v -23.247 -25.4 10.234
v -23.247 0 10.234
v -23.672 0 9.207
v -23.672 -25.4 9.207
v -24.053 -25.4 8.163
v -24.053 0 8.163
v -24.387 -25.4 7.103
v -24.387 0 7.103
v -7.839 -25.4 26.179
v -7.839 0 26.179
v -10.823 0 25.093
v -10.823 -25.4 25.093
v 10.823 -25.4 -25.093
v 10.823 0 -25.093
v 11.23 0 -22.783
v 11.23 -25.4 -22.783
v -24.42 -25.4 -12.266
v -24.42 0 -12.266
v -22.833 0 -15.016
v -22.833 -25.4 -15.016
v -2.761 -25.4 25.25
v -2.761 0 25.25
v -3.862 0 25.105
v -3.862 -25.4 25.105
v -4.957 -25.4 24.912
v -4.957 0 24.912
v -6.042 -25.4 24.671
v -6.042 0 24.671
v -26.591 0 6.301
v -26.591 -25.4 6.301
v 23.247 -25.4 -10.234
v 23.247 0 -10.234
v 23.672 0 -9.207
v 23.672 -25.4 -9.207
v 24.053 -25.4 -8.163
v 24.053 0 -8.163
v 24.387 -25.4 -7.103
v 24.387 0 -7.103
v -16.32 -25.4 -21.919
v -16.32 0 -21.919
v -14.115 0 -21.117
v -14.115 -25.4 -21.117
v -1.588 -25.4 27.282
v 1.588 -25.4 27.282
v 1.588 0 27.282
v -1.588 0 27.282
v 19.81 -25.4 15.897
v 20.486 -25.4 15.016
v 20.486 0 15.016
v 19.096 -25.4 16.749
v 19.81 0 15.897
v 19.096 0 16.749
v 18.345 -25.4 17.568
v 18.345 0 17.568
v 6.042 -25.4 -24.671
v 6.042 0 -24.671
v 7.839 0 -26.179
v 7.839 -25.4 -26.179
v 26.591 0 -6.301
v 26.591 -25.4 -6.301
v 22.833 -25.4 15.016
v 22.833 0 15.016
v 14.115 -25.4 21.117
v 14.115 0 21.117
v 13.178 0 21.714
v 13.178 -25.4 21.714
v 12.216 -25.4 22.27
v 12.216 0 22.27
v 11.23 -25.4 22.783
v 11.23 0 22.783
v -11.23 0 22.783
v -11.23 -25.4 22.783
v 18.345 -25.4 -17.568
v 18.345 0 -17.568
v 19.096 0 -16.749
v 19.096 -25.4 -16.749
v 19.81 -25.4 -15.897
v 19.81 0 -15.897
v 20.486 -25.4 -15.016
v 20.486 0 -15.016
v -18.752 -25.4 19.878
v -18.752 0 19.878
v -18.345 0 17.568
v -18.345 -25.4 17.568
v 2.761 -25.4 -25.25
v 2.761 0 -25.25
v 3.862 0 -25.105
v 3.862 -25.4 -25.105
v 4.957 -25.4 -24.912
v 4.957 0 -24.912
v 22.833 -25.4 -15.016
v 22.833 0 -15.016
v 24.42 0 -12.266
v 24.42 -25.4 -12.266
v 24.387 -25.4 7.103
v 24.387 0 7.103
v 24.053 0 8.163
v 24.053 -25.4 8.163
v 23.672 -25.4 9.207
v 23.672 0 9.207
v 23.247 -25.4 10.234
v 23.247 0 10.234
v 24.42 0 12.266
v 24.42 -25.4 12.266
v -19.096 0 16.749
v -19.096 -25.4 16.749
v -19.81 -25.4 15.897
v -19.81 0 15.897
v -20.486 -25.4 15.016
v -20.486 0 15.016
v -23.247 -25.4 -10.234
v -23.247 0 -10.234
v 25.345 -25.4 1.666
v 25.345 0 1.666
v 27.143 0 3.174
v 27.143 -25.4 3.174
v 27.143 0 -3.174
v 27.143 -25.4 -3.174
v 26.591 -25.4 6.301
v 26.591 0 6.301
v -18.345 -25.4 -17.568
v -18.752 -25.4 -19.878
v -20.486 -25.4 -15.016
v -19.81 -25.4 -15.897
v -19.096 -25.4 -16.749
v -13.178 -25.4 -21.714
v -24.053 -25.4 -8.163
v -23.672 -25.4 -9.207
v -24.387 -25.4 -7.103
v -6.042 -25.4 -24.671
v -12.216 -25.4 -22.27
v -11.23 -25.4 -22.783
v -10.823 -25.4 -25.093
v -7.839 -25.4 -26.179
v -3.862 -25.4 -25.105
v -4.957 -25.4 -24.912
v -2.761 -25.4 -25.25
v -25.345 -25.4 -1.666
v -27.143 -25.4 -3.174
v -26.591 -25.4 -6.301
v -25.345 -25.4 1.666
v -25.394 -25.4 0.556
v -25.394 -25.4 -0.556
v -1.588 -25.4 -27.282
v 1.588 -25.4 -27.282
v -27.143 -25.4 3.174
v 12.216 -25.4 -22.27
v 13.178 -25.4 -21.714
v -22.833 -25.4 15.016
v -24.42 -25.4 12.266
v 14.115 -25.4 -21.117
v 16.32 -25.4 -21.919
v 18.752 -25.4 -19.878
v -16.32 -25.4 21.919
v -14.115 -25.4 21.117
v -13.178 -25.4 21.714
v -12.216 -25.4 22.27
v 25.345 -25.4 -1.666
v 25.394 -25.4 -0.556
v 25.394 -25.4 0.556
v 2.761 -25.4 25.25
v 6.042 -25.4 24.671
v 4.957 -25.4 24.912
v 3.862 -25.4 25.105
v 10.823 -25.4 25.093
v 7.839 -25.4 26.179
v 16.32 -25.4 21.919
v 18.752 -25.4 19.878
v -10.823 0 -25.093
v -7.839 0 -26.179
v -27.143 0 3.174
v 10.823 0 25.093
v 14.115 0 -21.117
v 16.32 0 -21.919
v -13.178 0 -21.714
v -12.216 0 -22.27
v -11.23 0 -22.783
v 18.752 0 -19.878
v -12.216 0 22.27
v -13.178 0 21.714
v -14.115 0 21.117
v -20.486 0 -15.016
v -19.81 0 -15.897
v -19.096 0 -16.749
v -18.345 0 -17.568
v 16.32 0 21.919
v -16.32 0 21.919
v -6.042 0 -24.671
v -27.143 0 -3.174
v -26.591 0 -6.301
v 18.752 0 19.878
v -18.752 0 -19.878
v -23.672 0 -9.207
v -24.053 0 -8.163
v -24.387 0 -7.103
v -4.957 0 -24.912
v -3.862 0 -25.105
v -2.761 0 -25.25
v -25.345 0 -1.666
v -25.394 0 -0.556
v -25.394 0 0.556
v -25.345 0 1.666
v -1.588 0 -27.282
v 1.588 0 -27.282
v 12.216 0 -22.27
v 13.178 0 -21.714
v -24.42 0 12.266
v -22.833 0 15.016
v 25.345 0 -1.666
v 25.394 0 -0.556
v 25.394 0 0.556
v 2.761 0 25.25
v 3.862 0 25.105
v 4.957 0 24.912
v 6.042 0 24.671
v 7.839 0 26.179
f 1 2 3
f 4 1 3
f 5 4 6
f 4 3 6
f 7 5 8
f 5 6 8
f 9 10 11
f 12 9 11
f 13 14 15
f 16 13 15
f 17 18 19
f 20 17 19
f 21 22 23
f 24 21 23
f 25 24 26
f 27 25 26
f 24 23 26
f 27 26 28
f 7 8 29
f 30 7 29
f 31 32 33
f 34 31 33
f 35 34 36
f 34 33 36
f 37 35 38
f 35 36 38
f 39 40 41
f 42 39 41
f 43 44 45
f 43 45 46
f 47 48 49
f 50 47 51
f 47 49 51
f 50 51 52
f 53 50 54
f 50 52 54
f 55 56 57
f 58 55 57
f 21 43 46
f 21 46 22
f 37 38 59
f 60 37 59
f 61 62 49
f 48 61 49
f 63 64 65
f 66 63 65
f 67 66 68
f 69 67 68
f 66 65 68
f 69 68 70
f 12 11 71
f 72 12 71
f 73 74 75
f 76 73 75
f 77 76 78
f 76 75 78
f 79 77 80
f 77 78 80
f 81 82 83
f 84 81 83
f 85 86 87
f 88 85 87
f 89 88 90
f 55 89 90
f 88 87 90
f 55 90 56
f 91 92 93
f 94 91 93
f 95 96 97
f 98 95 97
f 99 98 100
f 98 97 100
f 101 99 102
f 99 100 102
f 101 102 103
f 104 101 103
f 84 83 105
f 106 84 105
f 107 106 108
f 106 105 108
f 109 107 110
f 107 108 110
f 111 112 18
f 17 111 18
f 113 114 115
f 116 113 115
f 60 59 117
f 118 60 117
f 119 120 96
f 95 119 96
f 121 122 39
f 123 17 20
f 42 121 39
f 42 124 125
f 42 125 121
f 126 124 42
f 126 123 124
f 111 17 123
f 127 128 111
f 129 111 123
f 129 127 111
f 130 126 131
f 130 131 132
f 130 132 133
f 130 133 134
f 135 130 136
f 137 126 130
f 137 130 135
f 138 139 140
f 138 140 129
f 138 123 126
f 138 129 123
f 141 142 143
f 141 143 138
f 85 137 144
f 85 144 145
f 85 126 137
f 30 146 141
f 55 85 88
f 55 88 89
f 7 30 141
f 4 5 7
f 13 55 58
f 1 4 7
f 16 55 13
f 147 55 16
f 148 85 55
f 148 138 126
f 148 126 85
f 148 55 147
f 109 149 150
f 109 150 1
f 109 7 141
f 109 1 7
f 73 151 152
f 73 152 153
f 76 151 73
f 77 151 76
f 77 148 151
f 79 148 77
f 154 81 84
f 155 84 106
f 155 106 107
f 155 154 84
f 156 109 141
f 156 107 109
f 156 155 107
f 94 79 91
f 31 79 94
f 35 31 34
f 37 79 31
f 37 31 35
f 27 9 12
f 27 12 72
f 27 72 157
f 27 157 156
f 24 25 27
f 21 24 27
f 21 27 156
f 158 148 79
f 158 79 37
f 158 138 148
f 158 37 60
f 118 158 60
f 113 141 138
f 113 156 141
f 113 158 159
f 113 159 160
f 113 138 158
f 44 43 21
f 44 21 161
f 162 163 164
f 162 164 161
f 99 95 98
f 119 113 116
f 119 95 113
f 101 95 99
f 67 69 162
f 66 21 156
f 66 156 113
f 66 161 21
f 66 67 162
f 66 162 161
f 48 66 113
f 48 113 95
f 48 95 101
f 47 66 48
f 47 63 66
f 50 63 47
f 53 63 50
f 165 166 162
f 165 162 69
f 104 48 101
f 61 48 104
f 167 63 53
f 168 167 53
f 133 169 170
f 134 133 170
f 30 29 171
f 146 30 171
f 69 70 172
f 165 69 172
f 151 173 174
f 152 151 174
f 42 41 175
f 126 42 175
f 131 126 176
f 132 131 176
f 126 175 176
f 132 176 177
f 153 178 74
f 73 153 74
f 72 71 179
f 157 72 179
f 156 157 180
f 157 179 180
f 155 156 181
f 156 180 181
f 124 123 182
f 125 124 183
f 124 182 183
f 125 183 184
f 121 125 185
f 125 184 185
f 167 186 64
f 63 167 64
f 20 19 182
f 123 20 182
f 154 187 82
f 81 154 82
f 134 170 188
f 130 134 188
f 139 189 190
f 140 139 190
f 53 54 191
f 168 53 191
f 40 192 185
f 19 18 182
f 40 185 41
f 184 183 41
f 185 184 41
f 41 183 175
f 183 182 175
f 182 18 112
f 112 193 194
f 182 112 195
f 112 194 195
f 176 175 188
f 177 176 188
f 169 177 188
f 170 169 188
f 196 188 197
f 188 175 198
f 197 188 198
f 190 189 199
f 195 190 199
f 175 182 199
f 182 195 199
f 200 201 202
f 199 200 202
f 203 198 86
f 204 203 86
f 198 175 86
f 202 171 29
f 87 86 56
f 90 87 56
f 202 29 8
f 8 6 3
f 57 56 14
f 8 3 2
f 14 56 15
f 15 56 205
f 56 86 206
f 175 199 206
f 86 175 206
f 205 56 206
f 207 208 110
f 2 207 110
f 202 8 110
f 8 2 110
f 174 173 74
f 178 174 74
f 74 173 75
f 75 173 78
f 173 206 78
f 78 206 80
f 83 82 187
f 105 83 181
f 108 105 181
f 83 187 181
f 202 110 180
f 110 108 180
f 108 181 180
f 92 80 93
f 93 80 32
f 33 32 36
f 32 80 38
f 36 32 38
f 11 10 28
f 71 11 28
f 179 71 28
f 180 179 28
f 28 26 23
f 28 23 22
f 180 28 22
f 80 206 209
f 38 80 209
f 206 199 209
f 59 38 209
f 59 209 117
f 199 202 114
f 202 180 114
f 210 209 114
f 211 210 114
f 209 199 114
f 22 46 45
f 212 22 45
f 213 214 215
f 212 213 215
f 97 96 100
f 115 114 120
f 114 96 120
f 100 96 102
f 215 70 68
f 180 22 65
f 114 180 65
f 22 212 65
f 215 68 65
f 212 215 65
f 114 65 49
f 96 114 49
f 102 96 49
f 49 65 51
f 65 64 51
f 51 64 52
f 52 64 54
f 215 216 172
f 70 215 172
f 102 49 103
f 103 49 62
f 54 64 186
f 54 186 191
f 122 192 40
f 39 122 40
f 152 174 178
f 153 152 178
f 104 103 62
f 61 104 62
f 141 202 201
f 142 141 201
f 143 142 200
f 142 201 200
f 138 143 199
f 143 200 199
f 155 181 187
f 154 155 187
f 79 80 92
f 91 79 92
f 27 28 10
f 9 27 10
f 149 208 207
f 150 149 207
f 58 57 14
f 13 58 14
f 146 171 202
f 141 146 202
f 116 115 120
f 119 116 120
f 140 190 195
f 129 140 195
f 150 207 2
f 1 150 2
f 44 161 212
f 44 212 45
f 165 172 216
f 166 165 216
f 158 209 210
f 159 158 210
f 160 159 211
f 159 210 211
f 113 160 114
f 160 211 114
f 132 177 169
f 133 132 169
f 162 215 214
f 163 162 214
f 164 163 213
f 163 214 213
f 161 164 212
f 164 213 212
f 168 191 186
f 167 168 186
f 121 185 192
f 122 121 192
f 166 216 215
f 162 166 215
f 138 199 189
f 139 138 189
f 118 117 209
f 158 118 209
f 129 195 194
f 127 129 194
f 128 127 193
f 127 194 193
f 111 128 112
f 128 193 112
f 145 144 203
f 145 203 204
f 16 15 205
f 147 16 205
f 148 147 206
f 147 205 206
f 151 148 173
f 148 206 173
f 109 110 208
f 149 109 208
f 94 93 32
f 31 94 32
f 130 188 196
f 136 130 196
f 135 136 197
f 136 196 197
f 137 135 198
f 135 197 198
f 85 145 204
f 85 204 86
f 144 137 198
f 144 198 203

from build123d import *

# Parameters (mm, degrees)
F1_DEPTH = 25.4


with BuildPart() as f1:
    # F0 (on Front) → F1 (new body)
    with BuildSketch(Plane.XZ):
        with BuildLine():
            Line((-1.5875, 27.281528), (-2.760676, 25.249528))
            ThreePointArc((-2.760676, 25.249528), (-4.410664, 25.014117), (-6.041661, 24.671002))
            ThreePointArc((-6.041661, 24.671002), (-8.687312, 23.868193), (-11.230034, 22.782589))
            ThreePointArc((-11.230034, 22.782589), (-12.7, 21.997045), (-14.115283, 21.116789))
            ThreePointArc((-14.115283, 21.116789), (-16.326805, 19.457529), (-18.344884, 17.567733))
            ThreePointArc((-18.344884, 17.567733), (-19.457529, 16.326805), (-20.486395, 15.015579))
            ThreePointArc((-20.486395, 15.015579), (-21.997045, 12.7), (-23.247071, 10.233949))
            ThreePointArc((-23.247071, 10.233949), (-23.868193, 8.687312), (-24.386545, 7.103269))
            ThreePointArc((-24.386545, 7.103269), (-25.014117, 4.410664), (-25.345317, 1.6658))
            ThreePointArc((-25.345317, 1.6658), (-25.4, 0), (-25.345317, -1.6658))
            ThreePointArc((-25.345317, -1.6658), (-25.014117, -4.410664), (-24.386545, -7.103269))
            ThreePointArc((-24.386545, -7.103269), (-23.868193, -8.687312), (-23.247071, -10.233949))
            ThreePointArc((-23.247071, -10.233949), (-21.997045, -12.7), (-20.486395, -15.015579))
            ThreePointArc((-20.486395, -15.015579), (-19.457529, -16.326805), (-18.344884, -17.567733))
            ThreePointArc((-18.344884, -17.567733), (-16.326805, -19.457529), (-14.115283, -21.116789))
            ThreePointArc((-14.115283, -21.116789), (-12.7, -21.997045), (-11.230034, -22.782589))
            ThreePointArc((-11.230034, -22.782589), (-8.687312, -23.868193), (-6.041661, -24.671002))
            ThreePointArc((-6.041661, -24.671002), (-4.410664, -25.014117), (-2.760676, -25.249528))
            ThreePointArc((-2.760676, -25.249528), (0, -25.4), (2.760676, -25.249528))
            ThreePointArc((2.760676, -25.249528), (4.410664, -25.014117), (6.041661, -24.671002))
            ThreePointArc((6.041661, -24.671002), (8.687312, -23.868193), (11.230034, -22.782589))
            ThreePointArc((11.230034, -22.782589), (12.7, -21.997045), (14.115283, -21.116789))
            ThreePointArc((14.115283, -21.116789), (16.326805, -19.457529), (18.344884, -17.567733))
            ThreePointArc((18.344884, -17.567733), (19.457529, -16.326805), (20.486395, -15.015579))
            ThreePointArc((20.486395, -15.015579), (21.997045, -12.7), (23.247071, -10.233949))
            ThreePointArc((23.247071, -10.233949), (23.868193, -8.687312), (24.386545, -7.103269))
            ThreePointArc((24.386545, -7.103269), (25.014117, -4.410664), (25.345317, -1.6658))
            ThreePointArc((25.345317, -1.6658), (25.4, 0), (25.345317, 1.6658))
            ThreePointArc((25.345317, 1.6658), (25.014117, 4.410664), (24.386545, 7.103269))
            ThreePointArc((24.386545, 7.103269), (23.868193, 8.687312), (23.247071, 10.233949))
            ThreePointArc((23.247071, 10.233949), (21.997045, 12.7), (20.486395, 15.015579))
            ThreePointArc((20.486395, 15.015579), (19.457529, 16.326805), (18.344884, 17.567733))
            ThreePointArc((18.344884, 17.567733), (16.326805, 19.457529), (14.115283, 21.116789))
            ThreePointArc((14.115283, 21.116789), (12.7, 21.997045), (11.230034, 22.782589))
            ThreePointArc((11.230034, 22.782589), (8.687312, 23.868193), (6.041661, 24.671002))
            ThreePointArc((6.041661, 24.671002), (4.410664, 25.014117), (2.760676, 25.249528))
            Line((2.760676, 25.249528), (1.5875, 27.281528))
            Line((1.5875, 27.281528), (-1.5875, 27.281528))
        make_face()
        with BuildLine():
            ThreePointArc((-11.230034, 22.782589), (-8.687312, 23.868193), (-6.041661, 24.671002))
            Line((-6.041661, 24.671002), (-7.83907, 26.179208))
            Line((-7.83907, 26.179208), (-10.822594, 25.093294))
            Line((-10.822594, 25.093294), (-11.230034, 22.782589))
        make_face()
        with BuildLine():
            ThreePointArc((-18.344884, 17.567733), (-16.326805, 19.457529), (-14.115283, 21.116789))
            Line((-14.115283, 21.116789), (-16.320133, 21.919288))
            Line((-16.320133, 21.919288), (-18.752324, 19.878438))
            Line((-18.752324, 19.878438), (-18.344884, 17.567733))
        make_face()
        with BuildLine():
            Line((7.83907, 26.179208), (6.041661, 24.671002))
            ThreePointArc((6.041661, 24.671002), (8.687312, 23.868193), (11.230034, 22.782589))
            Line((11.230034, 22.782589), (10.822594, 25.093294))
            Line((10.822594, 25.093294), (7.83907, 26.179208))
        make_face()
        with BuildLine():
            ThreePointArc((-23.247071, 10.233949), (-21.997045, 12.7), (-20.486395, 15.015579))
            Line((-20.486395, 15.015579), (-22.832746, 15.015579))
            Line((-22.832746, 15.015579), (-24.420246, 12.265949))
            Line((-24.420246, 12.265949), (-23.247071, 10.233949))
        make_face()
        with BuildLine():
            Line((16.320133, 21.919288), (14.115283, 21.116789))
            ThreePointArc((14.115283, 21.116789), (16.326805, 19.457529), (18.344884, 17.567733))
            Line((18.344884, 17.567733), (18.752324, 19.878438))
            Line((18.752324, 19.878438), (16.320133, 21.919288))
        make_face()
        with BuildLine():
            ThreePointArc((-25.345317, 1.6658), (-25.014117, 4.410664), (-24.386545, 7.103269))
            Line((-24.386545, 7.103269), (-26.591394, 6.30077))
            Line((-26.591394, 6.30077), (-27.142727, 3.174005))
            Line((-27.142727, 3.174005), (-25.345317, 1.6658))
        make_face()
        with BuildLine():
            Line((22.832746, 15.015579), (20.486395, 15.015579))
            ThreePointArc((20.486395, 15.015579), (21.997045, 12.7), (23.247071, 10.233949))
            Line((23.247071, 10.233949), (24.420246, 12.265949))
            Line((24.420246, 12.265949), (22.832746, 15.015579))
        make_face()
        with BuildLine():
            ThreePointArc((-24.386545, -7.103269), (-25.014117, -4.410664), (-25.345317, -1.6658))
            Line((-25.345317, -1.6658), (-27.142727, -3.174005))
            Line((-27.142727, -3.174005), (-26.591394, -6.30077))
            Line((-26.591394, -6.30077), (-24.386545, -7.103269))
        make_face()
        with BuildLine():
            Line((26.591394, 6.30077), (24.386545, 7.103269))
            ThreePointArc((24.386545, 7.103269), (25.014117, 4.410664), (25.345317, 1.6658))
            Line((25.345317, 1.6658), (27.142727, 3.174005))
            Line((27.142727, 3.174005), (26.591394, 6.30077))
        make_face()
        with BuildLine():
            ThreePointArc((-20.486395, -15.015579), (-21.997045, -12.7), (-23.247071, -10.233949))
            Line((-23.247071, -10.233949), (-24.420246, -12.265949))
            Line((-24.420246, -12.265949), (-22.832746, -15.015579))
            Line((-22.832746, -15.015579), (-20.486395, -15.015579))
        make_face()
        with BuildLine():
            Line((27.142727, -3.174005), (25.345317, -1.6658))
            ThreePointArc((25.345317, -1.6658), (25.014117, -4.410664), (24.386545, -7.103269))
            Line((24.386545, -7.103269), (26.591394, -6.30077))
            Line((26.591394, -6.30077), (27.142727, -3.174005))
        make_face()
        with BuildLine():
            ThreePointArc((-14.115283, -21.116789), (-16.326805, -19.457529), (-18.344884, -17.567733))
            Line((-18.344884, -17.567733), (-18.752324, -19.878438))
            Line((-18.752324, -19.878438), (-16.320133, -21.919288))
            Line((-16.320133, -21.919288), (-14.115283, -21.116789))
        make_face()
        with BuildLine():
            Line((24.420246, -12.265949), (23.247071, -10.233949))
            ThreePointArc((23.247071, -10.233949), (21.997045, -12.7), (20.486395, -15.015579))
            Line((20.486395, -15.015579), (22.832746, -15.015579))
            Line((22.832746, -15.015579), (24.420246, -12.265949))
        make_face()
        with BuildLine():
            ThreePointArc((-6.041661, -24.671002), (-8.687312, -23.868193), (-11.230034, -22.782589))
            Line((-11.230034, -22.782589), (-10.822594, -25.093294))
            Line((-10.822594, -25.093294), (-7.83907, -26.179208))
            Line((-7.83907, -26.179208), (-6.041661, -24.671002))
        make_face()
        with BuildLine():
            Line((18.752324, -19.878438), (18.344884, -17.567733))
            ThreePointArc((18.344884, -17.567733), (16.326805, -19.457529), (14.115283, -21.116789))
            Line((14.115283, -21.116789), (16.320133, -21.919288))
            Line((16.320133, -21.919288), (18.752324, -19.878438))
        make_face()
        with BuildLine():
            ThreePointArc((2.760676, -25.249528), (0, -25.4), (-2.760676, -25.249528))
            Line((-2.760676, -25.249528), (-1.5875, -27.281528))
            Line((-1.5875, -27.281528), (1.5875, -27.281528))
            Line((1.5875, -27.281528), (2.760676, -25.249528))
        make_face()
        with BuildLine():
            Line((10.822594, -25.093294), (11.230034, -22.782589))
            ThreePointArc((11.230034, -22.782589), (8.687312, -23.868193), (6.041661, -24.671002))
            Line((6.041661, -24.671002), (7.83907, -26.179208))
            Line((7.83907, -26.179208), (10.822594, -25.093294))
        make_face()
    extrude(amount=F1_DEPTH)


solid = f1.part
